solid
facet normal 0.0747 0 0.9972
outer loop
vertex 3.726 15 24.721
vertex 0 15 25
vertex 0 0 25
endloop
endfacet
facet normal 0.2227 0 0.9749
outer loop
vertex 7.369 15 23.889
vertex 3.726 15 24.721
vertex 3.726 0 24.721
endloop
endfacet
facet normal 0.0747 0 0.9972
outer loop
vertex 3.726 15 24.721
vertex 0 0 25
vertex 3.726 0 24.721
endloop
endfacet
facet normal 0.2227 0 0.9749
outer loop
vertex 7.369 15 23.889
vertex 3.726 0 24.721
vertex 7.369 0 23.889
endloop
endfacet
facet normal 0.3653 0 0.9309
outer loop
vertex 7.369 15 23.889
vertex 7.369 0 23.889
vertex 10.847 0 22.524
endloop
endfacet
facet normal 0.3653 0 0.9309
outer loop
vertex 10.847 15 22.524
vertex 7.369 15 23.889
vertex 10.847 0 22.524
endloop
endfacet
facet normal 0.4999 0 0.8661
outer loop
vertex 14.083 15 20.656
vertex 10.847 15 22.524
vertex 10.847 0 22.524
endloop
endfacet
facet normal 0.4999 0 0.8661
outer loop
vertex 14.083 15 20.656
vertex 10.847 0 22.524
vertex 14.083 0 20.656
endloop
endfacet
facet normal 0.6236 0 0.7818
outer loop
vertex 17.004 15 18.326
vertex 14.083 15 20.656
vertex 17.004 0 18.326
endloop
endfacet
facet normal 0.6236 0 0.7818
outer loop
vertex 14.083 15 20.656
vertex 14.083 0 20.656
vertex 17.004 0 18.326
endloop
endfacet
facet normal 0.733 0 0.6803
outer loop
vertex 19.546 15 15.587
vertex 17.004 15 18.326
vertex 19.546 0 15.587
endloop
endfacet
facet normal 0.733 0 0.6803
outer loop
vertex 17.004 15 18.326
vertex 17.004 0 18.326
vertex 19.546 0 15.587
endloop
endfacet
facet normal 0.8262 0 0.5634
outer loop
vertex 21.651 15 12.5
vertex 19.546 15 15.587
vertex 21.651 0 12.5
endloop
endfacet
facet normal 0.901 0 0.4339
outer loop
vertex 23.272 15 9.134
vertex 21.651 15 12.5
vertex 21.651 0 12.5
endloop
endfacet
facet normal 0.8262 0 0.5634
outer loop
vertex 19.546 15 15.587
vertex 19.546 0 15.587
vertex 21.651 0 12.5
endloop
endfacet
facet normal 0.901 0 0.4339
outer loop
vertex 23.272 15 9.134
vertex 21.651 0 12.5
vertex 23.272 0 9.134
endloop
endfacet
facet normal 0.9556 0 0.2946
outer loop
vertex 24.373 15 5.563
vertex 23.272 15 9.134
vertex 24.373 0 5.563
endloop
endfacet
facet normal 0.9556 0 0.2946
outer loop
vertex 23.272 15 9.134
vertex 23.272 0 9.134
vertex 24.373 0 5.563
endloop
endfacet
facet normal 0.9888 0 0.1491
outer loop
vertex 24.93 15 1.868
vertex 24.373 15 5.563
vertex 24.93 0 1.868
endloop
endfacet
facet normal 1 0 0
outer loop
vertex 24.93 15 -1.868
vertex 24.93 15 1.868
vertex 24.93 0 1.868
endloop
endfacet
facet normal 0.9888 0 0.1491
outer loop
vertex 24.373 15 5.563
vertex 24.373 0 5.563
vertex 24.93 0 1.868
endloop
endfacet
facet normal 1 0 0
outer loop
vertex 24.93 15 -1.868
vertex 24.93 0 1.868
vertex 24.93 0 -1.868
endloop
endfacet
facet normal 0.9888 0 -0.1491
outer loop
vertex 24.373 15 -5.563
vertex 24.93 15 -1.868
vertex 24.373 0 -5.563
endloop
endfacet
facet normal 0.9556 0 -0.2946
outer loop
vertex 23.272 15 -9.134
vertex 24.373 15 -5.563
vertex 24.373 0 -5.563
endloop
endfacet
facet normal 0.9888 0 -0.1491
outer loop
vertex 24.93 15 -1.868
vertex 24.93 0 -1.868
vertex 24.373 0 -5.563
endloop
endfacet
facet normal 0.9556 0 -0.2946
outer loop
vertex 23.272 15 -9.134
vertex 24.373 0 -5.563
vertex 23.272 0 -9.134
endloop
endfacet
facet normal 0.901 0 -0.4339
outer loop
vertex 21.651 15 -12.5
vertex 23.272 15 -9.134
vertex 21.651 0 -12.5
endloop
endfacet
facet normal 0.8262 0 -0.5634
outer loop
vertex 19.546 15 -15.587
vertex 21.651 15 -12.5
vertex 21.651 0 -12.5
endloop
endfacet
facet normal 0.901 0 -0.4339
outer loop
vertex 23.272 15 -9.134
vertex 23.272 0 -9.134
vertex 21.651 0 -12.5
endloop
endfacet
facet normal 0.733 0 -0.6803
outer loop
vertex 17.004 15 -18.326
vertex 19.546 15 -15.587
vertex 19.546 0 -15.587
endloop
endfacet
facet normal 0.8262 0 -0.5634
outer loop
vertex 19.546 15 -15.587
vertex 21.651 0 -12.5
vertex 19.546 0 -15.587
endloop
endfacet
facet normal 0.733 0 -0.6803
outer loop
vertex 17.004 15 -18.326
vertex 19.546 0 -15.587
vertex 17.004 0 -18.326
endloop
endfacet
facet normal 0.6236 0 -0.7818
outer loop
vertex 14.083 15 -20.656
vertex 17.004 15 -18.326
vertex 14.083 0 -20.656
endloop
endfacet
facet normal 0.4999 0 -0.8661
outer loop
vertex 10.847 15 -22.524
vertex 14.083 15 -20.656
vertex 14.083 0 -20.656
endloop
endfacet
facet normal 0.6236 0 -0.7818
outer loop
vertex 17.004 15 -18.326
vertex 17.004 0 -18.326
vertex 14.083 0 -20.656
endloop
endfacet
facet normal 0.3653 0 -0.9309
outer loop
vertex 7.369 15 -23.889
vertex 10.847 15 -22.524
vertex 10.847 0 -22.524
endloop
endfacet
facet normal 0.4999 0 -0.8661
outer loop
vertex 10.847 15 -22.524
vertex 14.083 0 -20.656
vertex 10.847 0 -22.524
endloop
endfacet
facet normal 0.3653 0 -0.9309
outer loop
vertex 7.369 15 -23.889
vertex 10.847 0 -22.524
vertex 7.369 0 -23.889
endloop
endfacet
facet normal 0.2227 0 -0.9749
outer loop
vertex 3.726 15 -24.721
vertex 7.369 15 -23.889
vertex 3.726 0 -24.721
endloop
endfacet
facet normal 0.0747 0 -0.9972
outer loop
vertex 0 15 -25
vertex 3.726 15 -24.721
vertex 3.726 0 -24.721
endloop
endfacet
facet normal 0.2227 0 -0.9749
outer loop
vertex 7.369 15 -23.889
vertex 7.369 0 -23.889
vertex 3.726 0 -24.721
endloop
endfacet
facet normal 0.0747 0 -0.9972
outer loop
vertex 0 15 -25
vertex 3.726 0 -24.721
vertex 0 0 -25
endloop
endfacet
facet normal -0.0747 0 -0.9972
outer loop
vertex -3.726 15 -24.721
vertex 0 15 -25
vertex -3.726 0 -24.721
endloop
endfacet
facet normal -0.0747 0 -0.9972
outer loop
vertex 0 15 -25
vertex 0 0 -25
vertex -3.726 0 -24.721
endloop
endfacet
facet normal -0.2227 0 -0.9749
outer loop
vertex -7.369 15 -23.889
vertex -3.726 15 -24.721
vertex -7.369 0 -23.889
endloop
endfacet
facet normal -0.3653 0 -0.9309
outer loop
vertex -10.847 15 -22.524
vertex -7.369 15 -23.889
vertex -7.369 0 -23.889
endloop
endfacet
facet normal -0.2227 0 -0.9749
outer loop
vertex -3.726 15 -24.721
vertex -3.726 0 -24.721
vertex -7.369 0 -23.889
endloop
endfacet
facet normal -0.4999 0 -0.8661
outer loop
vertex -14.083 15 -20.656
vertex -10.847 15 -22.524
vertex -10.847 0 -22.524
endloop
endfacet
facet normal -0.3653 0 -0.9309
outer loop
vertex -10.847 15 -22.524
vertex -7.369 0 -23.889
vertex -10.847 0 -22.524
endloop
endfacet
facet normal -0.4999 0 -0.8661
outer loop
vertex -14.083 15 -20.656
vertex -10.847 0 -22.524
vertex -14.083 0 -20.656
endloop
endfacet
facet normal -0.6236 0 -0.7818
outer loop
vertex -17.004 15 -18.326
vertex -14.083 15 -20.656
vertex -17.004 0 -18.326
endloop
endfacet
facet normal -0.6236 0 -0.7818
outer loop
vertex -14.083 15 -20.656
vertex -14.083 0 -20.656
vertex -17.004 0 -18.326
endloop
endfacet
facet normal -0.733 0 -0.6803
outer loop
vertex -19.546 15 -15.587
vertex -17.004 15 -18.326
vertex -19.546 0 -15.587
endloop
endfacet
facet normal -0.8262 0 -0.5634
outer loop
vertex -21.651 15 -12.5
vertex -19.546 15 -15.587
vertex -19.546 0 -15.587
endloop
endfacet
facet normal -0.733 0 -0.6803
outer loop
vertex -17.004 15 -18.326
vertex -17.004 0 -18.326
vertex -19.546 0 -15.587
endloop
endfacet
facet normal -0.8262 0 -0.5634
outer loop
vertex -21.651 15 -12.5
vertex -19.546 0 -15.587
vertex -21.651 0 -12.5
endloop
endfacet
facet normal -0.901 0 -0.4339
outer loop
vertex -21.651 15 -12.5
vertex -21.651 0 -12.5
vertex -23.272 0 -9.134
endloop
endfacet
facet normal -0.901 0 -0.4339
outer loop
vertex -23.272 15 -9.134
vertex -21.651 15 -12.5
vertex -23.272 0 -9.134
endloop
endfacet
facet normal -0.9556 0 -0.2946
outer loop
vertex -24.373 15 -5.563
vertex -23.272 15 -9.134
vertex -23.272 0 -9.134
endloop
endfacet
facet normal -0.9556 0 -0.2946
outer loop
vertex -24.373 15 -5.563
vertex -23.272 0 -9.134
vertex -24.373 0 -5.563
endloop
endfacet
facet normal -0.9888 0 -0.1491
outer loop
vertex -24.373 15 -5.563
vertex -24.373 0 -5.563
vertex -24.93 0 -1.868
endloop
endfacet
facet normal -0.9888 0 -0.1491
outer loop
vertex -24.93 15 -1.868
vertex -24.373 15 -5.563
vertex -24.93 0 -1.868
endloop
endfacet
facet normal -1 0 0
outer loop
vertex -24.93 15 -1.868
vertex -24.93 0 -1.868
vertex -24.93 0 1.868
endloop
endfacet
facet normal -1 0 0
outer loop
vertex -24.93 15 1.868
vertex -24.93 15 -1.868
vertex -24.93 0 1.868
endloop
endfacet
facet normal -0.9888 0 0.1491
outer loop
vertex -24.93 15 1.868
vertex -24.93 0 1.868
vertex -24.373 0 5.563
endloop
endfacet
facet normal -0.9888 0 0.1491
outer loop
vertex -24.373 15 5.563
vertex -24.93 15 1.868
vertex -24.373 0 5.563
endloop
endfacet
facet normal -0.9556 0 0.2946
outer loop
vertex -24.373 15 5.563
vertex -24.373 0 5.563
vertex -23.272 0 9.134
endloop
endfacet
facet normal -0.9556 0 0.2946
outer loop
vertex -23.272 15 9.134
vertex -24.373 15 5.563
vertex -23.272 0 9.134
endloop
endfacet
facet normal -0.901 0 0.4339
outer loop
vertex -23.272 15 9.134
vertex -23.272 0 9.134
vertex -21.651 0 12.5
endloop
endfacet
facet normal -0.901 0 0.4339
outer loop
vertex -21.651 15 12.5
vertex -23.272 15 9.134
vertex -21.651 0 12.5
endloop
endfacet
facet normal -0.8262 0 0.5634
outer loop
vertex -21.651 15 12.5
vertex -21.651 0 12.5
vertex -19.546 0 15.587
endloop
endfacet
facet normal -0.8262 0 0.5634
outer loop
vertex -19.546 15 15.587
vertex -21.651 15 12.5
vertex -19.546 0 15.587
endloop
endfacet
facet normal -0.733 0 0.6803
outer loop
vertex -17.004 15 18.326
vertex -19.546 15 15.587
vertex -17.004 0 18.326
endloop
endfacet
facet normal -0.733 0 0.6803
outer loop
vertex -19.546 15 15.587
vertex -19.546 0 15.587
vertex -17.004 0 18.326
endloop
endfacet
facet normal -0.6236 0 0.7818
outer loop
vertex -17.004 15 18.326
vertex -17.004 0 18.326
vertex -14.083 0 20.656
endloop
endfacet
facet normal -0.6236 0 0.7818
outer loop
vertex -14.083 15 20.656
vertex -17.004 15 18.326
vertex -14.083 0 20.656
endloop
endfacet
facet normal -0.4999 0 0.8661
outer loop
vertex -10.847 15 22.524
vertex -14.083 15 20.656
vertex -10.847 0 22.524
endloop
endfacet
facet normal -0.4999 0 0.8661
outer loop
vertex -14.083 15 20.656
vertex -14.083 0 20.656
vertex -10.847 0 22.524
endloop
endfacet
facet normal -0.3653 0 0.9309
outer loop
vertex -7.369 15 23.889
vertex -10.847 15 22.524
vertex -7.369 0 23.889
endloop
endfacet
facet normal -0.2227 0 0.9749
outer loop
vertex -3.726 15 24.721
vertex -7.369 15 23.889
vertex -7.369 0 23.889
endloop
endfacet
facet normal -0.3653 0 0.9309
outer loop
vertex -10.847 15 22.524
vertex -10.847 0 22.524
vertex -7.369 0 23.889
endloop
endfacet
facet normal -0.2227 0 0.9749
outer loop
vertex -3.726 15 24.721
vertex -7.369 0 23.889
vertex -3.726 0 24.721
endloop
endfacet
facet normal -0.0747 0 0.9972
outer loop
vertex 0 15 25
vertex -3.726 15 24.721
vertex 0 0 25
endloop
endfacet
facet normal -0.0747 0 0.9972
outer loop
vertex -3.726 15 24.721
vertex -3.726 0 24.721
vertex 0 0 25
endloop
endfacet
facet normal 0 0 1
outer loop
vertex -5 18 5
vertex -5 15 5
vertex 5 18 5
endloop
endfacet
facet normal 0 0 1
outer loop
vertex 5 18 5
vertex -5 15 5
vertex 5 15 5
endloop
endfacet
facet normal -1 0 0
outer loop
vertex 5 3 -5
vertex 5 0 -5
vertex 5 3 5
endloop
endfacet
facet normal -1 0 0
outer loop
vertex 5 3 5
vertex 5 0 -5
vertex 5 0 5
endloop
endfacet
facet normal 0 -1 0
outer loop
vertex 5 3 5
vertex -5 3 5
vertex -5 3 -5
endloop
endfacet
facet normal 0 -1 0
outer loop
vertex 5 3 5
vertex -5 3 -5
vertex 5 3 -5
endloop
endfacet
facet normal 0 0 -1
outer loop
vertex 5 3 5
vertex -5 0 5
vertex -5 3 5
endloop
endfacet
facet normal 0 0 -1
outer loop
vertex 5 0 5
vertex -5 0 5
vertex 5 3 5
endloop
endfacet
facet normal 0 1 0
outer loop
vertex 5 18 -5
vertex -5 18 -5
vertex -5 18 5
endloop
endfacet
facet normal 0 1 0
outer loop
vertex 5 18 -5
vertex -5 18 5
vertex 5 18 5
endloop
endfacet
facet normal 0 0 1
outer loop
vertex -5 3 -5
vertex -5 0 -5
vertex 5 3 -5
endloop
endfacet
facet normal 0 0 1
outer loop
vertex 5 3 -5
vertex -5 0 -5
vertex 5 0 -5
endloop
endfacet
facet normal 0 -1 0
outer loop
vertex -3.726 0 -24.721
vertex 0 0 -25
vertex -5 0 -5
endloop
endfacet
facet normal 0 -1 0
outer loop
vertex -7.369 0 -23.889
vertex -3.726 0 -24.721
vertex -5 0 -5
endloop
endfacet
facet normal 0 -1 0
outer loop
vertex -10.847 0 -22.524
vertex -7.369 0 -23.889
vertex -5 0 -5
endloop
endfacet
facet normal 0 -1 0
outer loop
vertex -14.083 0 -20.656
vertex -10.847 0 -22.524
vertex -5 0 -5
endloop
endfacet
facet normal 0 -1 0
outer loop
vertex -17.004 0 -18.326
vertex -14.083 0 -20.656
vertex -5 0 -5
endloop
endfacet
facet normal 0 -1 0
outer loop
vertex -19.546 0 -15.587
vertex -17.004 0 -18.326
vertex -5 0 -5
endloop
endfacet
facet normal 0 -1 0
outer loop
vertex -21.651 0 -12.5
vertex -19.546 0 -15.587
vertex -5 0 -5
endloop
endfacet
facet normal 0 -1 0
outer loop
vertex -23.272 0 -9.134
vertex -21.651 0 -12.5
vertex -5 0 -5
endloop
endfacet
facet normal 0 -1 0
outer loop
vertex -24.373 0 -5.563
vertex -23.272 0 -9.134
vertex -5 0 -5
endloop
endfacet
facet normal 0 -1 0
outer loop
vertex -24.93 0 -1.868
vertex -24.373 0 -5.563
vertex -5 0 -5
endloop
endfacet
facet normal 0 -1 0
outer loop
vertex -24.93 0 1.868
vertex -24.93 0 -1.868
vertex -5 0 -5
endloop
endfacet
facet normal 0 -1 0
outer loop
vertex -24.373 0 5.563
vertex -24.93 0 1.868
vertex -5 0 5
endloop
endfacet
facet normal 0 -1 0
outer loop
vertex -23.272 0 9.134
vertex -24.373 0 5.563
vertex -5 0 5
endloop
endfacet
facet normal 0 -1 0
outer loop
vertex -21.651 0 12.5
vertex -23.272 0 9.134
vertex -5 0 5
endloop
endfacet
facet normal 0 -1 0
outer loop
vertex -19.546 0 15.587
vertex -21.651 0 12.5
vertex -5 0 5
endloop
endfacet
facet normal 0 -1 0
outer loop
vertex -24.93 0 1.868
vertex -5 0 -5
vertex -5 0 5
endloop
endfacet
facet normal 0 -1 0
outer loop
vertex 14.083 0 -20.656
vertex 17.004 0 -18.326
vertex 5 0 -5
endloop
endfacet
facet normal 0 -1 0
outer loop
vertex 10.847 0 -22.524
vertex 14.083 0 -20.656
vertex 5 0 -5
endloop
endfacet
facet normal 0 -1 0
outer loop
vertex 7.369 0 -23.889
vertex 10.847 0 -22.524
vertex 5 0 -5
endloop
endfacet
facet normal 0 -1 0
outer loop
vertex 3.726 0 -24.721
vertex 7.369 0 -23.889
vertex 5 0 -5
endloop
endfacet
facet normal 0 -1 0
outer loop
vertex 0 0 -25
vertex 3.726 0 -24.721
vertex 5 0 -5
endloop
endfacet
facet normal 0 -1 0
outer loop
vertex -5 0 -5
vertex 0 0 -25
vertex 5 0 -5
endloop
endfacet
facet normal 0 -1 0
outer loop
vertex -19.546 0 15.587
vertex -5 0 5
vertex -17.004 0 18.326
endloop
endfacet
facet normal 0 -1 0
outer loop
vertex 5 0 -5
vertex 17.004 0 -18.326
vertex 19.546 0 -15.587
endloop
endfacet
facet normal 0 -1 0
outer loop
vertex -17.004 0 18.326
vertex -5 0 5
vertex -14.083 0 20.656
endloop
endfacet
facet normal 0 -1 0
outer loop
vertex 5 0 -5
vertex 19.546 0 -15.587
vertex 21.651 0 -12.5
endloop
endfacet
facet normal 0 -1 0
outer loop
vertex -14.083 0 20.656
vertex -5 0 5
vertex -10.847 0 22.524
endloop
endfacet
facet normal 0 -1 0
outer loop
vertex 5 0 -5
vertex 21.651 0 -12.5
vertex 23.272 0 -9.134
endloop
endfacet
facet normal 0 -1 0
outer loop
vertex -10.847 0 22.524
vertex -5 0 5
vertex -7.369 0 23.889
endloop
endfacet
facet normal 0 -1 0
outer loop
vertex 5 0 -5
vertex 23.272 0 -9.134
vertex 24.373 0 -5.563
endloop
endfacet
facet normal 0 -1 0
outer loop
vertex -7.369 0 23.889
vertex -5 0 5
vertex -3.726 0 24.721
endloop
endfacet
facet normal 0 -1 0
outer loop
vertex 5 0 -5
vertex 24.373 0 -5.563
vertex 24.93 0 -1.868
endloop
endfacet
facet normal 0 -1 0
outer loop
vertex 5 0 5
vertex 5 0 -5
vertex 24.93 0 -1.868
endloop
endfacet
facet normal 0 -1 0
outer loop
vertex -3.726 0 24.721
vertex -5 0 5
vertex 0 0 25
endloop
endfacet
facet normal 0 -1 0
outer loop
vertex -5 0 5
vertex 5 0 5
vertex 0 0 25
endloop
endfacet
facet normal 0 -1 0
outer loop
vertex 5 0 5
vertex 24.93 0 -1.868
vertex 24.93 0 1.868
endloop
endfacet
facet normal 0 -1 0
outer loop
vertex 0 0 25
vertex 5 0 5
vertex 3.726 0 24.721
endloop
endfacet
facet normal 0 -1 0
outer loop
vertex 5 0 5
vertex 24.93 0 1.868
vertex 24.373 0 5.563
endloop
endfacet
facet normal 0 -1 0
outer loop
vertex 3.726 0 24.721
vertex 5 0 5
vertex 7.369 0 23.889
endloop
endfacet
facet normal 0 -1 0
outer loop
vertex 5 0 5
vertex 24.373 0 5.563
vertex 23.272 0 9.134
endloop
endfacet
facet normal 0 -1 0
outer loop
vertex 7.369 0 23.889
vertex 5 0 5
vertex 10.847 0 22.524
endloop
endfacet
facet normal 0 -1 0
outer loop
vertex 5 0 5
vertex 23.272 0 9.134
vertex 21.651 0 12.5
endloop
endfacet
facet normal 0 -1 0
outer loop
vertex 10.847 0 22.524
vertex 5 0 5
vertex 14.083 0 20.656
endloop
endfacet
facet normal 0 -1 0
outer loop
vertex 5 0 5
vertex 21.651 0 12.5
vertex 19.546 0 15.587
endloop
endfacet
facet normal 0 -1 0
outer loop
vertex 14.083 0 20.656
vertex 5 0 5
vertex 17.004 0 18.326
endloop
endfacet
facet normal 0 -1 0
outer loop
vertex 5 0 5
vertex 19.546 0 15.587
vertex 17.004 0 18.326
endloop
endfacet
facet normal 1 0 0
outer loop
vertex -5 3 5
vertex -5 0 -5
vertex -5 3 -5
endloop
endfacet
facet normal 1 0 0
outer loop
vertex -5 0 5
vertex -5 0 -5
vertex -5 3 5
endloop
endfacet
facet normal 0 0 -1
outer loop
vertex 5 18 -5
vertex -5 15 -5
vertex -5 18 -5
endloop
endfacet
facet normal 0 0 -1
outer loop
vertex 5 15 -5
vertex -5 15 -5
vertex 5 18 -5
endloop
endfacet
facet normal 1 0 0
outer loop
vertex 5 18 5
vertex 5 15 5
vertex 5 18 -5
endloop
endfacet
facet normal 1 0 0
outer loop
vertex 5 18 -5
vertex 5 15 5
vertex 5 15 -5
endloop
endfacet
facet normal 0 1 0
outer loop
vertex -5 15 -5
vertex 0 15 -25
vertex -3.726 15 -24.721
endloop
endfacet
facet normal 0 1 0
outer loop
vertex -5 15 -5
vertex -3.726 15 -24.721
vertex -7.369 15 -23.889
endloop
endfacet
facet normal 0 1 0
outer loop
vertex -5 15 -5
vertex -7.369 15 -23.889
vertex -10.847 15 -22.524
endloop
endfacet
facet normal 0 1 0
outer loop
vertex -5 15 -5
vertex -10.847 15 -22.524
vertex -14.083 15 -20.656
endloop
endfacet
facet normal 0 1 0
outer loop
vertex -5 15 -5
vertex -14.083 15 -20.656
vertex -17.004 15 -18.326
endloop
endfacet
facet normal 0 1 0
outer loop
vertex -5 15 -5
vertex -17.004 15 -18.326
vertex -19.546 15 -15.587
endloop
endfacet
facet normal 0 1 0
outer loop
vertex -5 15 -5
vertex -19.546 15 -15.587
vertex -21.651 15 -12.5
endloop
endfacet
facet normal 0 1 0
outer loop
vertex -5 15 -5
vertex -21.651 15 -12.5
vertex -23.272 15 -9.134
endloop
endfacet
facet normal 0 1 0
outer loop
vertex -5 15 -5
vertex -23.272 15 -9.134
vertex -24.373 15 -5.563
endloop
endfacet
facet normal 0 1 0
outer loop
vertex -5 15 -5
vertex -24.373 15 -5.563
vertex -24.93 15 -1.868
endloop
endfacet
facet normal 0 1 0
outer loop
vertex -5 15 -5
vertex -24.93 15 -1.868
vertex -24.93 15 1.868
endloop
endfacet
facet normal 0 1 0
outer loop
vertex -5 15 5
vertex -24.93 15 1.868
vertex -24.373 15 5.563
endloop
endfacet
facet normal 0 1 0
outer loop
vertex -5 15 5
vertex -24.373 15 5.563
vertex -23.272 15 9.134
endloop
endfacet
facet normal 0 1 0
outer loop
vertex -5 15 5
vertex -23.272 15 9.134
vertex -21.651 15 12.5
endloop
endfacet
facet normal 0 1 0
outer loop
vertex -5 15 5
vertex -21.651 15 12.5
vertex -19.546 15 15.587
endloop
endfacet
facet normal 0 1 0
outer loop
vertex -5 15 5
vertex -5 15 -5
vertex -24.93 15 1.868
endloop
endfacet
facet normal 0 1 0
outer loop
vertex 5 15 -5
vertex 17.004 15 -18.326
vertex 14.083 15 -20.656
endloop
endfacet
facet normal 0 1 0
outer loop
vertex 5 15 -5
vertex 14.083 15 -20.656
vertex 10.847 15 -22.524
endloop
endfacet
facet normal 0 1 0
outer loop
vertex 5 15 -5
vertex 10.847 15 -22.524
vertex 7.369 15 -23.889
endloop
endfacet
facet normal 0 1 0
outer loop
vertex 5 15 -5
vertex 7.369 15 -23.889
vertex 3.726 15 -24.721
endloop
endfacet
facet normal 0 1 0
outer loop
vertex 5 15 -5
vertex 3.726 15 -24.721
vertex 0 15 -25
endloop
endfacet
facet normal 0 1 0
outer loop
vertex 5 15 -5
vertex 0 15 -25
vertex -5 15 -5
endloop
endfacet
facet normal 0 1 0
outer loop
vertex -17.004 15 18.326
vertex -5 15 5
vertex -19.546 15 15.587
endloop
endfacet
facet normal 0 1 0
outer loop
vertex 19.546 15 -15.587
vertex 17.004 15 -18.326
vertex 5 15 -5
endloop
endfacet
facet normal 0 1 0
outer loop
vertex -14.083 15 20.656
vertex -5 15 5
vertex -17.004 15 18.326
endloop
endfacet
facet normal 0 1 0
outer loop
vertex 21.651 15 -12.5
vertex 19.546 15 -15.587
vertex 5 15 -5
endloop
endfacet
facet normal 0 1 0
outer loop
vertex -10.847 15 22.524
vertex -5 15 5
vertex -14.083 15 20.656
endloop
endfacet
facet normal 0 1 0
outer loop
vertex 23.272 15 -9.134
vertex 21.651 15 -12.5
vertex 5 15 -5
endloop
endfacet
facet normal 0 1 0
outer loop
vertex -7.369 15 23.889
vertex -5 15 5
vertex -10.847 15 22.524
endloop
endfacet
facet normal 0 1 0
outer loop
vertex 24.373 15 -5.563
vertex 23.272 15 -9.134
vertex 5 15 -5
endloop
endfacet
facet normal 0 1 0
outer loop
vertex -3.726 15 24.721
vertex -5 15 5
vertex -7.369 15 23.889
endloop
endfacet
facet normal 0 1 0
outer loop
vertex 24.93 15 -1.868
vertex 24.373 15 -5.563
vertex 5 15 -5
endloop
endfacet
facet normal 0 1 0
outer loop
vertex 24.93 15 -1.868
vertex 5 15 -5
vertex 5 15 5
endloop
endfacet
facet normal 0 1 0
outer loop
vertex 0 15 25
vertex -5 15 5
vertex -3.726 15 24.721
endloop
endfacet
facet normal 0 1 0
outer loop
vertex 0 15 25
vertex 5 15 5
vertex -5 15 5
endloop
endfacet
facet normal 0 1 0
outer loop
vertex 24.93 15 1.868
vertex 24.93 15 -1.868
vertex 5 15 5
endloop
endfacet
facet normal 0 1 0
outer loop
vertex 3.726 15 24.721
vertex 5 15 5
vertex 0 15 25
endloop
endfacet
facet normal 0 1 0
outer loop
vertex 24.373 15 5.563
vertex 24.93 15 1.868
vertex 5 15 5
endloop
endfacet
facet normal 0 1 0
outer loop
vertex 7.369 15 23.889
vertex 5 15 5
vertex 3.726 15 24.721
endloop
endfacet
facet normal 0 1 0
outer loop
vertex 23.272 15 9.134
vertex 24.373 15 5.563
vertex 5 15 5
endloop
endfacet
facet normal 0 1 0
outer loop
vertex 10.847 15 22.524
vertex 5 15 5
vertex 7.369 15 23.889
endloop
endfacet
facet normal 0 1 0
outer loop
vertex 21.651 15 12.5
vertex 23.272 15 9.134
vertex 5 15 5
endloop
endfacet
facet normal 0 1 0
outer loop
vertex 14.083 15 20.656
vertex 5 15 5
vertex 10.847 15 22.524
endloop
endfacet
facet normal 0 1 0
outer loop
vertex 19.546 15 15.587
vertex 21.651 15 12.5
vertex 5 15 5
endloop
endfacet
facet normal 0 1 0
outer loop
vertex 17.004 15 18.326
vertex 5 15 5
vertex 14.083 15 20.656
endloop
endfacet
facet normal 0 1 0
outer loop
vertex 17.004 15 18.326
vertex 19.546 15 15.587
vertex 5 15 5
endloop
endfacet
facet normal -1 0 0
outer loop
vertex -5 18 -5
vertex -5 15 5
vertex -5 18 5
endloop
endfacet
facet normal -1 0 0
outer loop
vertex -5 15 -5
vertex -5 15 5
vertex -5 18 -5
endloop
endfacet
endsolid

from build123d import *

# Parameters (mm, degrees)
SKETCH1_R           = 25
BOSS_EXTRUDE1_DEPTH = 15
SKETCH2_W           = 10
SKETCH2_H           = 10
BOSS_EXTRUDE2_DEPTH = 3
SKETCH3_W           = 10
SKETCH3_H           = 10
CUT_EXTRUDE1_DEPTH  = 3


with BuildPart() as part:
    # Sketch1 → Boss-Extrude1 (new body)
    with BuildSketch(Plane(origin=(0, 0, 0), x_dir=(1, 0, 0), z_dir=(0, 1, 0))):
        with Locations(Location((0, 0, 0), (0, 0, 270))):
            Circle(SKETCH1_R)
    extrude(amount=BOSS_EXTRUDE1_DEPTH)

    # Sketch2 → Boss-Extrude2 (add)
    with BuildSketch(Plane(origin=(0, 15, 0), x_dir=(1, 0, 0), z_dir=(0, 1, 0))):
        Rectangle(SKETCH2_W, SKETCH2_H)
    extrude(amount=BOSS_EXTRUDE2_DEPTH)

    # Sketch3 → Cut-Extrude1 (cut)
    with BuildSketch(Plane.XZ):
        Rectangle(SKETCH3_W, SKETCH3_H)
    extrude(amount=-CUT_EXTRUDE1_DEPTH, mode=Mode.SUBTRACT)


solid = part.part
